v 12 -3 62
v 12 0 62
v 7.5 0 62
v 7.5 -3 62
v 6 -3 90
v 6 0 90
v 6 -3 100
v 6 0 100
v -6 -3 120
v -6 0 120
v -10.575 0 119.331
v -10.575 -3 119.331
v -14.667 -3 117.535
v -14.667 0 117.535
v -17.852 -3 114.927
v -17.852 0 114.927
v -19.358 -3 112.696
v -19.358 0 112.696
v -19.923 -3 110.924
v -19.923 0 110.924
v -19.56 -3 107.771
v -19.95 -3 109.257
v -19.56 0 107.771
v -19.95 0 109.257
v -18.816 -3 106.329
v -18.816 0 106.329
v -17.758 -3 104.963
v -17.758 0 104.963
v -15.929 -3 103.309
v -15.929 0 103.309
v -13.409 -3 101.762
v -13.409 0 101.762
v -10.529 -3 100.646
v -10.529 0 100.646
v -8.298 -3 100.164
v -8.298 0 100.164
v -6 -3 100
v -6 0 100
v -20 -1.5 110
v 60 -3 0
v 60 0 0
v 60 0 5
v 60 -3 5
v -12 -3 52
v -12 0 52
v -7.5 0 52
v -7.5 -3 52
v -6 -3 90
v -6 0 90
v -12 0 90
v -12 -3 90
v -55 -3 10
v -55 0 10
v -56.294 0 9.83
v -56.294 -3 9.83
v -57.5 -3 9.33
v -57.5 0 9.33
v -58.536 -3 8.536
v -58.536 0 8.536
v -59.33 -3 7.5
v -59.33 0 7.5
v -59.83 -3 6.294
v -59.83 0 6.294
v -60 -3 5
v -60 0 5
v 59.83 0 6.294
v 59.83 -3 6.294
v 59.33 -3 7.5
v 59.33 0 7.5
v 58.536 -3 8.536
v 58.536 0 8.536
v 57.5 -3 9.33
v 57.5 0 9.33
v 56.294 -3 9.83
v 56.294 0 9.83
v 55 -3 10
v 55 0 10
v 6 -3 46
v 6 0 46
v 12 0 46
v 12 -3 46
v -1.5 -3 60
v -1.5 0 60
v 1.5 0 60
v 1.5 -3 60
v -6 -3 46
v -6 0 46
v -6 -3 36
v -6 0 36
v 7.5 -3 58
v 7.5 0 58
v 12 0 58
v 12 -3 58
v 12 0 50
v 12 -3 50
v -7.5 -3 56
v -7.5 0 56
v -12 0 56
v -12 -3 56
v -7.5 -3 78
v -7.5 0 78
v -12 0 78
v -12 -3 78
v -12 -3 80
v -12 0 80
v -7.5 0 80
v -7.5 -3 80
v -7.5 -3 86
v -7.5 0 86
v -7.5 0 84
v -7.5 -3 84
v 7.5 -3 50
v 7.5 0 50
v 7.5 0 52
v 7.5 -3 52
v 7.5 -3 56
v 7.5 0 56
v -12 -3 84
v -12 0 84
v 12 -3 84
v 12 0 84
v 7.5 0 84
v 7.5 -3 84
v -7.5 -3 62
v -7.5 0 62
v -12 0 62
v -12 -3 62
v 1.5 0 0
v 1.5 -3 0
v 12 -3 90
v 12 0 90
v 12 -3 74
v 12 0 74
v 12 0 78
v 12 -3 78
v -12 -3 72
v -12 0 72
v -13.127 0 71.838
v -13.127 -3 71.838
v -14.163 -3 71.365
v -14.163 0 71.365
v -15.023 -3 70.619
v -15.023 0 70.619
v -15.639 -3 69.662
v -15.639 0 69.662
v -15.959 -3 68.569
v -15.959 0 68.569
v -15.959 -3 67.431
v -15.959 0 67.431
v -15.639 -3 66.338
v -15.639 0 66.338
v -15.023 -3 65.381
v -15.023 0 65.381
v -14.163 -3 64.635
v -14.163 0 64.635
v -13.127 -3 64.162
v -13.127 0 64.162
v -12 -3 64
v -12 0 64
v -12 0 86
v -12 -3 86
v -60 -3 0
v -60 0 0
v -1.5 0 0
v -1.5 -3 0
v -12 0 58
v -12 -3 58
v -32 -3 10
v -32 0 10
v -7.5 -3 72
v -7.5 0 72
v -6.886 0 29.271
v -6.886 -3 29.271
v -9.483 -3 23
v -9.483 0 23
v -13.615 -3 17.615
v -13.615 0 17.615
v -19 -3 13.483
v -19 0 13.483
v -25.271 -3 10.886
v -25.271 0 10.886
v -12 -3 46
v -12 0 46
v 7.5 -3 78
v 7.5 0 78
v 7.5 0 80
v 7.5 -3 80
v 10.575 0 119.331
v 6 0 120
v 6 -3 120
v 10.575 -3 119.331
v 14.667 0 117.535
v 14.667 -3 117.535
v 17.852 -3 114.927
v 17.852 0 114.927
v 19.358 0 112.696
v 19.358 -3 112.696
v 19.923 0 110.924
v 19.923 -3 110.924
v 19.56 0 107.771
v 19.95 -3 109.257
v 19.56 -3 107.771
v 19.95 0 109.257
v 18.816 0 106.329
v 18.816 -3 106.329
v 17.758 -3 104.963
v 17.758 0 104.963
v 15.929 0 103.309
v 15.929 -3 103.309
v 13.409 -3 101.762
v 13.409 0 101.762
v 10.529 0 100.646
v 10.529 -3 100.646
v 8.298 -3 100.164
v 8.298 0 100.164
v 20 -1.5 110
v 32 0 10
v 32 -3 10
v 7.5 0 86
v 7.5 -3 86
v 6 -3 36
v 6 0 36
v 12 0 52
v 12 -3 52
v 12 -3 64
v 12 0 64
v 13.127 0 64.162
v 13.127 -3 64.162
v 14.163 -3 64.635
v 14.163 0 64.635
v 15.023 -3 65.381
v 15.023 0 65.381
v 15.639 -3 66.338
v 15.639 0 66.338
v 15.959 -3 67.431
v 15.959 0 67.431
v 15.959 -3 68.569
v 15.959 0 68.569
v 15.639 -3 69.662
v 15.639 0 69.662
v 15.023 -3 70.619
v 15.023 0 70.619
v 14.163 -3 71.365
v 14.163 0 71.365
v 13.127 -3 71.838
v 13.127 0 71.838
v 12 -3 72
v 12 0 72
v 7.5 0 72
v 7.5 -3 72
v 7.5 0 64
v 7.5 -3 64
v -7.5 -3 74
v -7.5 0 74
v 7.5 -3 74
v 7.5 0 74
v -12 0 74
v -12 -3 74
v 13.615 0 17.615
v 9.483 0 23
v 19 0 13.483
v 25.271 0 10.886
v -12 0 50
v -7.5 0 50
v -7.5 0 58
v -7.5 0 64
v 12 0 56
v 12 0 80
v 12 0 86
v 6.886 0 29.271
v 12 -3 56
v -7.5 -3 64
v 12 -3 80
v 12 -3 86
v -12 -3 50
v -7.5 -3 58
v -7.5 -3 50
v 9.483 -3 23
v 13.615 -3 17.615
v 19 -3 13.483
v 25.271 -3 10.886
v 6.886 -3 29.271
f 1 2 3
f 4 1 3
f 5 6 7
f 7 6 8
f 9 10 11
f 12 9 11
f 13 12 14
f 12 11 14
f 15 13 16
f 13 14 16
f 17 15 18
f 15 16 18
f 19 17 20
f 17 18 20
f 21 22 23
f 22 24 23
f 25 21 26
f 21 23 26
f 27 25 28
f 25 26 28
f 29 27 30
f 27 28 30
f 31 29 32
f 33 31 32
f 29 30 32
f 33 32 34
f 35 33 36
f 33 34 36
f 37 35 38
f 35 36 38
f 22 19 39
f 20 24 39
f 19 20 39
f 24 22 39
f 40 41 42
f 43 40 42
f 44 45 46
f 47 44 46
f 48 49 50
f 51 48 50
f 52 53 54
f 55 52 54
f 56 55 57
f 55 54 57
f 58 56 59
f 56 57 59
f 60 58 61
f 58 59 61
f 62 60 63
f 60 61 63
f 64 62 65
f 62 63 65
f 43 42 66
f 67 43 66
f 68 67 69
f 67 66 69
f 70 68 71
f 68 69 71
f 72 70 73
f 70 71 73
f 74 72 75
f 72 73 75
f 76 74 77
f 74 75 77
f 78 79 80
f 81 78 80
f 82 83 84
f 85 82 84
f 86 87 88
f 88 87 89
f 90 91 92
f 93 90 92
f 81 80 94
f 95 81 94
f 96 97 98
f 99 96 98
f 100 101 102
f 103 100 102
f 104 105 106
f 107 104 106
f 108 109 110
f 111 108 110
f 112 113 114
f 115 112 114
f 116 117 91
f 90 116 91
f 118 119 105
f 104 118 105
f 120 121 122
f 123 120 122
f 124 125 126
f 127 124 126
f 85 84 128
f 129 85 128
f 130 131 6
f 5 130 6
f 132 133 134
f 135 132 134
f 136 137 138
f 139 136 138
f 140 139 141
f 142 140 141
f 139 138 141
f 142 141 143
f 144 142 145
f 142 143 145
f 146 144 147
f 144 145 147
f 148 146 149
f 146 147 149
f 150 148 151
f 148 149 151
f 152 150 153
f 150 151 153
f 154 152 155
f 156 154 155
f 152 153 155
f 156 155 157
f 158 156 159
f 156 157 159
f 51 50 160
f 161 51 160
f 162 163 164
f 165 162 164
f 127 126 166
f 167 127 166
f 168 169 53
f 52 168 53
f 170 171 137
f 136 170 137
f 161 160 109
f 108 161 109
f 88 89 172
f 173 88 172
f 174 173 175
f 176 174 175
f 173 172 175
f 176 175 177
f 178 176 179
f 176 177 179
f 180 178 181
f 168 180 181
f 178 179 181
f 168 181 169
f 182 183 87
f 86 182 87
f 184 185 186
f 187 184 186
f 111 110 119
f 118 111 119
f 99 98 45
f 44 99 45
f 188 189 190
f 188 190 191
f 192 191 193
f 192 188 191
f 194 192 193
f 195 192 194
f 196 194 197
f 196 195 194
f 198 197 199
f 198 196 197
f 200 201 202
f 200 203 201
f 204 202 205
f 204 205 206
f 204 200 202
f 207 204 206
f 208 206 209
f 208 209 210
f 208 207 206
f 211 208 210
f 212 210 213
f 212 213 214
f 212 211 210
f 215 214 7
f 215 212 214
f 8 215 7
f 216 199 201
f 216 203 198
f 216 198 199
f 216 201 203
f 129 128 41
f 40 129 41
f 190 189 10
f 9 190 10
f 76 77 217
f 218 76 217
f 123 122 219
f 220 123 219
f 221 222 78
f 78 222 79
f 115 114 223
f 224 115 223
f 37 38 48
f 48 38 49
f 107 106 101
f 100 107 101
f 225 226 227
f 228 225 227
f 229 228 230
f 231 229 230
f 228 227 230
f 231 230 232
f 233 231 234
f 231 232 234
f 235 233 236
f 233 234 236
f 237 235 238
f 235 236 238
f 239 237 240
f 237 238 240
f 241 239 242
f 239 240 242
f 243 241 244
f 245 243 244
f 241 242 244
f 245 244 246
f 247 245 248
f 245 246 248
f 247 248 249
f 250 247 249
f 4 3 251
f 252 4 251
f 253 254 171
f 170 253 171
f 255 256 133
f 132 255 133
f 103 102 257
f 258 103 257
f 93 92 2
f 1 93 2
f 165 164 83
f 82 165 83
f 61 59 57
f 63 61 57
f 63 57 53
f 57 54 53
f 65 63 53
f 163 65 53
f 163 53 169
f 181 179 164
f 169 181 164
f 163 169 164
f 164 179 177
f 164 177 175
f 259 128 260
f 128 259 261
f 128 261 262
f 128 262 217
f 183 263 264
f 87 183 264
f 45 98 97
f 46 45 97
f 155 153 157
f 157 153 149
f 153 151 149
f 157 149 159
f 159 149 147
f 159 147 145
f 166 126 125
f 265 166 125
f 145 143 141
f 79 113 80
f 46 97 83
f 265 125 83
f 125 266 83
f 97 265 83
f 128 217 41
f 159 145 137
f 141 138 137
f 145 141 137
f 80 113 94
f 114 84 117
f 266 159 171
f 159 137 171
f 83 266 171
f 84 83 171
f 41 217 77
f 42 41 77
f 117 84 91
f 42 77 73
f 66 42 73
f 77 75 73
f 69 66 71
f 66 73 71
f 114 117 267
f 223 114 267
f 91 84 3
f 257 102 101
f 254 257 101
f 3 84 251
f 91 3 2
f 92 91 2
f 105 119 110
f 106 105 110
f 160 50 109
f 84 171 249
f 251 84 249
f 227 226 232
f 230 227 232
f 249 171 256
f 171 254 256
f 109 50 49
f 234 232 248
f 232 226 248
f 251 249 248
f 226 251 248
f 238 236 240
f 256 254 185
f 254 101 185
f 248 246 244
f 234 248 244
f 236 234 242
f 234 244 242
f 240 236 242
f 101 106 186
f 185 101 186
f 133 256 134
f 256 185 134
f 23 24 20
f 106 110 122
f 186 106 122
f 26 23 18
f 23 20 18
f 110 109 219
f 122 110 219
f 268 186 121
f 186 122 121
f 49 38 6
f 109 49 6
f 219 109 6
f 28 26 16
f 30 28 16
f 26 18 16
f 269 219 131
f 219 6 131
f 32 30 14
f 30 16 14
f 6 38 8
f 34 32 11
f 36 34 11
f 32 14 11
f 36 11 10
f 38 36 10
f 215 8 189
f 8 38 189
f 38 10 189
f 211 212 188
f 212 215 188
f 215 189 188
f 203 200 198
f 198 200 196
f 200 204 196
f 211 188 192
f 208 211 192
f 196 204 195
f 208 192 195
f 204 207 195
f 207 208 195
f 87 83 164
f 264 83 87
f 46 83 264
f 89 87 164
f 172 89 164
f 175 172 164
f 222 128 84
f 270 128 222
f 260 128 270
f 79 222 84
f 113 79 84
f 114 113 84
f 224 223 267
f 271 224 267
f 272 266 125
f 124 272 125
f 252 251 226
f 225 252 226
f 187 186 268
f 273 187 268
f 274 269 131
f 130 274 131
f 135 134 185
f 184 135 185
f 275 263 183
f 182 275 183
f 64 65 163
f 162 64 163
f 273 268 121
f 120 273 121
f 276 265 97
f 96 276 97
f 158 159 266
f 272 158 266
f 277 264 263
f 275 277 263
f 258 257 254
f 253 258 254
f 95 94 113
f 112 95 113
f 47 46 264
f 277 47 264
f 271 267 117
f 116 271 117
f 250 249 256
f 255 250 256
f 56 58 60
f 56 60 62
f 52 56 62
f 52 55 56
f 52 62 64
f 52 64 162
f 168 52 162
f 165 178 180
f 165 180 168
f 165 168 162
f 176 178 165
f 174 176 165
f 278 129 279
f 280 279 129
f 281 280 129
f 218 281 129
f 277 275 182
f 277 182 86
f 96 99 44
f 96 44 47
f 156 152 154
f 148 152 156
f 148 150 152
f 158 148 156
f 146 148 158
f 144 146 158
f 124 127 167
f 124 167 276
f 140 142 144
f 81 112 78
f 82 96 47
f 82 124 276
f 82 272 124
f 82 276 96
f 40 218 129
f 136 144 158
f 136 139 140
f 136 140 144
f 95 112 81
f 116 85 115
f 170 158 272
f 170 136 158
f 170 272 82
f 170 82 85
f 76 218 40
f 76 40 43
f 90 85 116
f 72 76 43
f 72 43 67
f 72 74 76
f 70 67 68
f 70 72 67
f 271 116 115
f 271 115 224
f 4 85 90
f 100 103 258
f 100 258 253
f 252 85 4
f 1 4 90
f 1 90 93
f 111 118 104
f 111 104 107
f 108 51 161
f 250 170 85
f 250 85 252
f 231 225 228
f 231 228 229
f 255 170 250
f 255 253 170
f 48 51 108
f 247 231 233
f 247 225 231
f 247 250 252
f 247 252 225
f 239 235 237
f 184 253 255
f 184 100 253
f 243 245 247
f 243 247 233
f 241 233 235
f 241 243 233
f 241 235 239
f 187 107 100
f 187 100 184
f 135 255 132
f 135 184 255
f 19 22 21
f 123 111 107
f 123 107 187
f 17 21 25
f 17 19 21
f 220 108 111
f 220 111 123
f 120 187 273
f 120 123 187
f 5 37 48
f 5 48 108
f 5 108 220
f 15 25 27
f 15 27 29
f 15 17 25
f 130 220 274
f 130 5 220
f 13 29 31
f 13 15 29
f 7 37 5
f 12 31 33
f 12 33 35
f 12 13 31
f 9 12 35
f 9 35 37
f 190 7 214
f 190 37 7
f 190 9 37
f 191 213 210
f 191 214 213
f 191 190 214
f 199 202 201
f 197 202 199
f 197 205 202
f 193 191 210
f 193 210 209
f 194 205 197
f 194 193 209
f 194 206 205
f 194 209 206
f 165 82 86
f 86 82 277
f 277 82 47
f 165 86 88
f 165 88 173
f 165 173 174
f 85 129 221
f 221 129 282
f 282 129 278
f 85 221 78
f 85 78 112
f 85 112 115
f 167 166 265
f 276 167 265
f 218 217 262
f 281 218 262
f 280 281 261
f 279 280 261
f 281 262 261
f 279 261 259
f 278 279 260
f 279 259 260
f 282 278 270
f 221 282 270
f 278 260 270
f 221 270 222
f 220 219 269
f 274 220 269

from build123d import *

# Parameters (mm, degrees)
F1_DEPTH = 3


# Not quite as in the source:
# - a feature names something its author has since deleted; it is built from what else it names


with BuildPart() as f1:
    # F0 (on Front) → F1 (new body)
    with BuildSketch(Plane.XZ):
        with BuildLine():
            Line((-1.5, 100), (-1.5, 120))
            Line((-1.5, 120), (-6, 120))
            add(Edge.make_bspline(
                [(-6, 120), (-13.1006129086, 120), (-20, 115.0061184168), (-20, 110)],
                knots=[0, 0, 0, 0, 0.5, 0.5, 0.5, 0.5], degree=3))
            add(Edge.make_bspline(
                [(-20, 110), (-20, 104.9938815832), (-13.1006129086, 99.9755263329), (-6, 100)],
                knots=[0.5, 0.5, 0.5, 0.5, 1, 1, 1, 1], degree=3))
            Line((-6, 100), (-1.5, 100))
        make_face()
        Polygon((-12, 68), (-6, 68), (-6, 90), (-12, 90), (-12, 86), (-7.5, 86), (-7.5, 84), (-12, 84), (-12, 80), (-7.5, 80), (-7.5, 78), (-12, 78), (-12, 74), (-7.5, 74), (-7.5, 72), (-12, 72), align=None)
        Polygon((-12, 46), (-6, 46), (-6, 68), (-12, 68), (-12, 64), (-7.5, 64), (-7.5, 62), (-12, 62), (-12, 58), (-7.5, 58), (-7.5, 56), (-12, 56), (-12, 52), (-7.5, 52), (-7.5, 50), (-12, 50), align=None)
        with BuildLine():
            Line((-12, 64), (-12, 68))
            Line((-12, 68), (-12, 72))
            ThreePointArc((-12, 72), (-16, 68), (-12, 64))
        make_face()
        with BuildLine():
            Line((12, 68), (12, 64))
            ThreePointArc((12, 64), (16, 68), (12, 72))
            Line((12, 72), (12, 68))
        make_face()
        Polygon((6, 90), (6, 46), (12, 46), (12, 50), (7.5, 50), (7.5, 52), (12, 52), (12, 56), (7.5, 56), (7.5, 58), (12, 58), (12, 62), (7.5, 62), (7.5, 64), (12, 64), (12, 68), (12, 72), (7.5, 72), (7.5, 74), (12, 74), (12, 78), (7.5, 78), (7.5, 80), (12, 80), (12, 84), (7.5, 84), (7.5, 86), (12, 86), (12, 90), align=None)
        with BuildLine():
            Line((1.5, 0), (60, 0))
            Line((60, 0), (60, 5))
            ThreePointArc((60, 5), (58.5355339059, 8.5355339059), (55, 10))
            Line((55, 10), (32, 10))
            ThreePointArc((32, 10), (13.6152236891, 17.6152236891), (6, 36))
            Line((6, 36), (6, 46))
            Line((6, 46), (6, 90))
            Line((6, 90), (6, 100))
            add(Edge.make_bspline(
                [(6, 120), (13.1006129086, 120), (26.8993870914, 110.0122368336), (13.1006129086, 99.9755263329), (6, 100)],
                knots=[0, 0, 0, 0, 0.5, 1, 1, 1, 1], degree=3))
            Line((6, 120), (1.5, 120))
            Line((1.5, 120), (-1.5, 120))
            Line((-1.5, 120), (-1.5, 100))
            Line((-1.5, 100), (-6, 100))
            Line((-6, 100), (-6, 90))
            Line((-6, 90), (-6, 68))
            Line((-6, 68), (-6, 46))
            Line((-6, 46), (-6, 36))
            ThreePointArc((-6, 36), (-13.6152236891, 17.6152236891), (-32, 10))
            Line((-32, 10), (-55, 10))
            ThreePointArc((-55, 10), (-58.5355339059, 8.5355339059), (-60, 5))
            Line((-60, 5), (-60, 0))
            Line((-60, 0), (-1.5, 0))
            Line((-1.5, 0), (-1.5, 60))
            Line((-1.5, 60), (1.5, 60))
            Line((1.5, 60), (1.5, 0))
        make_face()
    extrude(amount=F1_DEPTH)


solid = f1.part
